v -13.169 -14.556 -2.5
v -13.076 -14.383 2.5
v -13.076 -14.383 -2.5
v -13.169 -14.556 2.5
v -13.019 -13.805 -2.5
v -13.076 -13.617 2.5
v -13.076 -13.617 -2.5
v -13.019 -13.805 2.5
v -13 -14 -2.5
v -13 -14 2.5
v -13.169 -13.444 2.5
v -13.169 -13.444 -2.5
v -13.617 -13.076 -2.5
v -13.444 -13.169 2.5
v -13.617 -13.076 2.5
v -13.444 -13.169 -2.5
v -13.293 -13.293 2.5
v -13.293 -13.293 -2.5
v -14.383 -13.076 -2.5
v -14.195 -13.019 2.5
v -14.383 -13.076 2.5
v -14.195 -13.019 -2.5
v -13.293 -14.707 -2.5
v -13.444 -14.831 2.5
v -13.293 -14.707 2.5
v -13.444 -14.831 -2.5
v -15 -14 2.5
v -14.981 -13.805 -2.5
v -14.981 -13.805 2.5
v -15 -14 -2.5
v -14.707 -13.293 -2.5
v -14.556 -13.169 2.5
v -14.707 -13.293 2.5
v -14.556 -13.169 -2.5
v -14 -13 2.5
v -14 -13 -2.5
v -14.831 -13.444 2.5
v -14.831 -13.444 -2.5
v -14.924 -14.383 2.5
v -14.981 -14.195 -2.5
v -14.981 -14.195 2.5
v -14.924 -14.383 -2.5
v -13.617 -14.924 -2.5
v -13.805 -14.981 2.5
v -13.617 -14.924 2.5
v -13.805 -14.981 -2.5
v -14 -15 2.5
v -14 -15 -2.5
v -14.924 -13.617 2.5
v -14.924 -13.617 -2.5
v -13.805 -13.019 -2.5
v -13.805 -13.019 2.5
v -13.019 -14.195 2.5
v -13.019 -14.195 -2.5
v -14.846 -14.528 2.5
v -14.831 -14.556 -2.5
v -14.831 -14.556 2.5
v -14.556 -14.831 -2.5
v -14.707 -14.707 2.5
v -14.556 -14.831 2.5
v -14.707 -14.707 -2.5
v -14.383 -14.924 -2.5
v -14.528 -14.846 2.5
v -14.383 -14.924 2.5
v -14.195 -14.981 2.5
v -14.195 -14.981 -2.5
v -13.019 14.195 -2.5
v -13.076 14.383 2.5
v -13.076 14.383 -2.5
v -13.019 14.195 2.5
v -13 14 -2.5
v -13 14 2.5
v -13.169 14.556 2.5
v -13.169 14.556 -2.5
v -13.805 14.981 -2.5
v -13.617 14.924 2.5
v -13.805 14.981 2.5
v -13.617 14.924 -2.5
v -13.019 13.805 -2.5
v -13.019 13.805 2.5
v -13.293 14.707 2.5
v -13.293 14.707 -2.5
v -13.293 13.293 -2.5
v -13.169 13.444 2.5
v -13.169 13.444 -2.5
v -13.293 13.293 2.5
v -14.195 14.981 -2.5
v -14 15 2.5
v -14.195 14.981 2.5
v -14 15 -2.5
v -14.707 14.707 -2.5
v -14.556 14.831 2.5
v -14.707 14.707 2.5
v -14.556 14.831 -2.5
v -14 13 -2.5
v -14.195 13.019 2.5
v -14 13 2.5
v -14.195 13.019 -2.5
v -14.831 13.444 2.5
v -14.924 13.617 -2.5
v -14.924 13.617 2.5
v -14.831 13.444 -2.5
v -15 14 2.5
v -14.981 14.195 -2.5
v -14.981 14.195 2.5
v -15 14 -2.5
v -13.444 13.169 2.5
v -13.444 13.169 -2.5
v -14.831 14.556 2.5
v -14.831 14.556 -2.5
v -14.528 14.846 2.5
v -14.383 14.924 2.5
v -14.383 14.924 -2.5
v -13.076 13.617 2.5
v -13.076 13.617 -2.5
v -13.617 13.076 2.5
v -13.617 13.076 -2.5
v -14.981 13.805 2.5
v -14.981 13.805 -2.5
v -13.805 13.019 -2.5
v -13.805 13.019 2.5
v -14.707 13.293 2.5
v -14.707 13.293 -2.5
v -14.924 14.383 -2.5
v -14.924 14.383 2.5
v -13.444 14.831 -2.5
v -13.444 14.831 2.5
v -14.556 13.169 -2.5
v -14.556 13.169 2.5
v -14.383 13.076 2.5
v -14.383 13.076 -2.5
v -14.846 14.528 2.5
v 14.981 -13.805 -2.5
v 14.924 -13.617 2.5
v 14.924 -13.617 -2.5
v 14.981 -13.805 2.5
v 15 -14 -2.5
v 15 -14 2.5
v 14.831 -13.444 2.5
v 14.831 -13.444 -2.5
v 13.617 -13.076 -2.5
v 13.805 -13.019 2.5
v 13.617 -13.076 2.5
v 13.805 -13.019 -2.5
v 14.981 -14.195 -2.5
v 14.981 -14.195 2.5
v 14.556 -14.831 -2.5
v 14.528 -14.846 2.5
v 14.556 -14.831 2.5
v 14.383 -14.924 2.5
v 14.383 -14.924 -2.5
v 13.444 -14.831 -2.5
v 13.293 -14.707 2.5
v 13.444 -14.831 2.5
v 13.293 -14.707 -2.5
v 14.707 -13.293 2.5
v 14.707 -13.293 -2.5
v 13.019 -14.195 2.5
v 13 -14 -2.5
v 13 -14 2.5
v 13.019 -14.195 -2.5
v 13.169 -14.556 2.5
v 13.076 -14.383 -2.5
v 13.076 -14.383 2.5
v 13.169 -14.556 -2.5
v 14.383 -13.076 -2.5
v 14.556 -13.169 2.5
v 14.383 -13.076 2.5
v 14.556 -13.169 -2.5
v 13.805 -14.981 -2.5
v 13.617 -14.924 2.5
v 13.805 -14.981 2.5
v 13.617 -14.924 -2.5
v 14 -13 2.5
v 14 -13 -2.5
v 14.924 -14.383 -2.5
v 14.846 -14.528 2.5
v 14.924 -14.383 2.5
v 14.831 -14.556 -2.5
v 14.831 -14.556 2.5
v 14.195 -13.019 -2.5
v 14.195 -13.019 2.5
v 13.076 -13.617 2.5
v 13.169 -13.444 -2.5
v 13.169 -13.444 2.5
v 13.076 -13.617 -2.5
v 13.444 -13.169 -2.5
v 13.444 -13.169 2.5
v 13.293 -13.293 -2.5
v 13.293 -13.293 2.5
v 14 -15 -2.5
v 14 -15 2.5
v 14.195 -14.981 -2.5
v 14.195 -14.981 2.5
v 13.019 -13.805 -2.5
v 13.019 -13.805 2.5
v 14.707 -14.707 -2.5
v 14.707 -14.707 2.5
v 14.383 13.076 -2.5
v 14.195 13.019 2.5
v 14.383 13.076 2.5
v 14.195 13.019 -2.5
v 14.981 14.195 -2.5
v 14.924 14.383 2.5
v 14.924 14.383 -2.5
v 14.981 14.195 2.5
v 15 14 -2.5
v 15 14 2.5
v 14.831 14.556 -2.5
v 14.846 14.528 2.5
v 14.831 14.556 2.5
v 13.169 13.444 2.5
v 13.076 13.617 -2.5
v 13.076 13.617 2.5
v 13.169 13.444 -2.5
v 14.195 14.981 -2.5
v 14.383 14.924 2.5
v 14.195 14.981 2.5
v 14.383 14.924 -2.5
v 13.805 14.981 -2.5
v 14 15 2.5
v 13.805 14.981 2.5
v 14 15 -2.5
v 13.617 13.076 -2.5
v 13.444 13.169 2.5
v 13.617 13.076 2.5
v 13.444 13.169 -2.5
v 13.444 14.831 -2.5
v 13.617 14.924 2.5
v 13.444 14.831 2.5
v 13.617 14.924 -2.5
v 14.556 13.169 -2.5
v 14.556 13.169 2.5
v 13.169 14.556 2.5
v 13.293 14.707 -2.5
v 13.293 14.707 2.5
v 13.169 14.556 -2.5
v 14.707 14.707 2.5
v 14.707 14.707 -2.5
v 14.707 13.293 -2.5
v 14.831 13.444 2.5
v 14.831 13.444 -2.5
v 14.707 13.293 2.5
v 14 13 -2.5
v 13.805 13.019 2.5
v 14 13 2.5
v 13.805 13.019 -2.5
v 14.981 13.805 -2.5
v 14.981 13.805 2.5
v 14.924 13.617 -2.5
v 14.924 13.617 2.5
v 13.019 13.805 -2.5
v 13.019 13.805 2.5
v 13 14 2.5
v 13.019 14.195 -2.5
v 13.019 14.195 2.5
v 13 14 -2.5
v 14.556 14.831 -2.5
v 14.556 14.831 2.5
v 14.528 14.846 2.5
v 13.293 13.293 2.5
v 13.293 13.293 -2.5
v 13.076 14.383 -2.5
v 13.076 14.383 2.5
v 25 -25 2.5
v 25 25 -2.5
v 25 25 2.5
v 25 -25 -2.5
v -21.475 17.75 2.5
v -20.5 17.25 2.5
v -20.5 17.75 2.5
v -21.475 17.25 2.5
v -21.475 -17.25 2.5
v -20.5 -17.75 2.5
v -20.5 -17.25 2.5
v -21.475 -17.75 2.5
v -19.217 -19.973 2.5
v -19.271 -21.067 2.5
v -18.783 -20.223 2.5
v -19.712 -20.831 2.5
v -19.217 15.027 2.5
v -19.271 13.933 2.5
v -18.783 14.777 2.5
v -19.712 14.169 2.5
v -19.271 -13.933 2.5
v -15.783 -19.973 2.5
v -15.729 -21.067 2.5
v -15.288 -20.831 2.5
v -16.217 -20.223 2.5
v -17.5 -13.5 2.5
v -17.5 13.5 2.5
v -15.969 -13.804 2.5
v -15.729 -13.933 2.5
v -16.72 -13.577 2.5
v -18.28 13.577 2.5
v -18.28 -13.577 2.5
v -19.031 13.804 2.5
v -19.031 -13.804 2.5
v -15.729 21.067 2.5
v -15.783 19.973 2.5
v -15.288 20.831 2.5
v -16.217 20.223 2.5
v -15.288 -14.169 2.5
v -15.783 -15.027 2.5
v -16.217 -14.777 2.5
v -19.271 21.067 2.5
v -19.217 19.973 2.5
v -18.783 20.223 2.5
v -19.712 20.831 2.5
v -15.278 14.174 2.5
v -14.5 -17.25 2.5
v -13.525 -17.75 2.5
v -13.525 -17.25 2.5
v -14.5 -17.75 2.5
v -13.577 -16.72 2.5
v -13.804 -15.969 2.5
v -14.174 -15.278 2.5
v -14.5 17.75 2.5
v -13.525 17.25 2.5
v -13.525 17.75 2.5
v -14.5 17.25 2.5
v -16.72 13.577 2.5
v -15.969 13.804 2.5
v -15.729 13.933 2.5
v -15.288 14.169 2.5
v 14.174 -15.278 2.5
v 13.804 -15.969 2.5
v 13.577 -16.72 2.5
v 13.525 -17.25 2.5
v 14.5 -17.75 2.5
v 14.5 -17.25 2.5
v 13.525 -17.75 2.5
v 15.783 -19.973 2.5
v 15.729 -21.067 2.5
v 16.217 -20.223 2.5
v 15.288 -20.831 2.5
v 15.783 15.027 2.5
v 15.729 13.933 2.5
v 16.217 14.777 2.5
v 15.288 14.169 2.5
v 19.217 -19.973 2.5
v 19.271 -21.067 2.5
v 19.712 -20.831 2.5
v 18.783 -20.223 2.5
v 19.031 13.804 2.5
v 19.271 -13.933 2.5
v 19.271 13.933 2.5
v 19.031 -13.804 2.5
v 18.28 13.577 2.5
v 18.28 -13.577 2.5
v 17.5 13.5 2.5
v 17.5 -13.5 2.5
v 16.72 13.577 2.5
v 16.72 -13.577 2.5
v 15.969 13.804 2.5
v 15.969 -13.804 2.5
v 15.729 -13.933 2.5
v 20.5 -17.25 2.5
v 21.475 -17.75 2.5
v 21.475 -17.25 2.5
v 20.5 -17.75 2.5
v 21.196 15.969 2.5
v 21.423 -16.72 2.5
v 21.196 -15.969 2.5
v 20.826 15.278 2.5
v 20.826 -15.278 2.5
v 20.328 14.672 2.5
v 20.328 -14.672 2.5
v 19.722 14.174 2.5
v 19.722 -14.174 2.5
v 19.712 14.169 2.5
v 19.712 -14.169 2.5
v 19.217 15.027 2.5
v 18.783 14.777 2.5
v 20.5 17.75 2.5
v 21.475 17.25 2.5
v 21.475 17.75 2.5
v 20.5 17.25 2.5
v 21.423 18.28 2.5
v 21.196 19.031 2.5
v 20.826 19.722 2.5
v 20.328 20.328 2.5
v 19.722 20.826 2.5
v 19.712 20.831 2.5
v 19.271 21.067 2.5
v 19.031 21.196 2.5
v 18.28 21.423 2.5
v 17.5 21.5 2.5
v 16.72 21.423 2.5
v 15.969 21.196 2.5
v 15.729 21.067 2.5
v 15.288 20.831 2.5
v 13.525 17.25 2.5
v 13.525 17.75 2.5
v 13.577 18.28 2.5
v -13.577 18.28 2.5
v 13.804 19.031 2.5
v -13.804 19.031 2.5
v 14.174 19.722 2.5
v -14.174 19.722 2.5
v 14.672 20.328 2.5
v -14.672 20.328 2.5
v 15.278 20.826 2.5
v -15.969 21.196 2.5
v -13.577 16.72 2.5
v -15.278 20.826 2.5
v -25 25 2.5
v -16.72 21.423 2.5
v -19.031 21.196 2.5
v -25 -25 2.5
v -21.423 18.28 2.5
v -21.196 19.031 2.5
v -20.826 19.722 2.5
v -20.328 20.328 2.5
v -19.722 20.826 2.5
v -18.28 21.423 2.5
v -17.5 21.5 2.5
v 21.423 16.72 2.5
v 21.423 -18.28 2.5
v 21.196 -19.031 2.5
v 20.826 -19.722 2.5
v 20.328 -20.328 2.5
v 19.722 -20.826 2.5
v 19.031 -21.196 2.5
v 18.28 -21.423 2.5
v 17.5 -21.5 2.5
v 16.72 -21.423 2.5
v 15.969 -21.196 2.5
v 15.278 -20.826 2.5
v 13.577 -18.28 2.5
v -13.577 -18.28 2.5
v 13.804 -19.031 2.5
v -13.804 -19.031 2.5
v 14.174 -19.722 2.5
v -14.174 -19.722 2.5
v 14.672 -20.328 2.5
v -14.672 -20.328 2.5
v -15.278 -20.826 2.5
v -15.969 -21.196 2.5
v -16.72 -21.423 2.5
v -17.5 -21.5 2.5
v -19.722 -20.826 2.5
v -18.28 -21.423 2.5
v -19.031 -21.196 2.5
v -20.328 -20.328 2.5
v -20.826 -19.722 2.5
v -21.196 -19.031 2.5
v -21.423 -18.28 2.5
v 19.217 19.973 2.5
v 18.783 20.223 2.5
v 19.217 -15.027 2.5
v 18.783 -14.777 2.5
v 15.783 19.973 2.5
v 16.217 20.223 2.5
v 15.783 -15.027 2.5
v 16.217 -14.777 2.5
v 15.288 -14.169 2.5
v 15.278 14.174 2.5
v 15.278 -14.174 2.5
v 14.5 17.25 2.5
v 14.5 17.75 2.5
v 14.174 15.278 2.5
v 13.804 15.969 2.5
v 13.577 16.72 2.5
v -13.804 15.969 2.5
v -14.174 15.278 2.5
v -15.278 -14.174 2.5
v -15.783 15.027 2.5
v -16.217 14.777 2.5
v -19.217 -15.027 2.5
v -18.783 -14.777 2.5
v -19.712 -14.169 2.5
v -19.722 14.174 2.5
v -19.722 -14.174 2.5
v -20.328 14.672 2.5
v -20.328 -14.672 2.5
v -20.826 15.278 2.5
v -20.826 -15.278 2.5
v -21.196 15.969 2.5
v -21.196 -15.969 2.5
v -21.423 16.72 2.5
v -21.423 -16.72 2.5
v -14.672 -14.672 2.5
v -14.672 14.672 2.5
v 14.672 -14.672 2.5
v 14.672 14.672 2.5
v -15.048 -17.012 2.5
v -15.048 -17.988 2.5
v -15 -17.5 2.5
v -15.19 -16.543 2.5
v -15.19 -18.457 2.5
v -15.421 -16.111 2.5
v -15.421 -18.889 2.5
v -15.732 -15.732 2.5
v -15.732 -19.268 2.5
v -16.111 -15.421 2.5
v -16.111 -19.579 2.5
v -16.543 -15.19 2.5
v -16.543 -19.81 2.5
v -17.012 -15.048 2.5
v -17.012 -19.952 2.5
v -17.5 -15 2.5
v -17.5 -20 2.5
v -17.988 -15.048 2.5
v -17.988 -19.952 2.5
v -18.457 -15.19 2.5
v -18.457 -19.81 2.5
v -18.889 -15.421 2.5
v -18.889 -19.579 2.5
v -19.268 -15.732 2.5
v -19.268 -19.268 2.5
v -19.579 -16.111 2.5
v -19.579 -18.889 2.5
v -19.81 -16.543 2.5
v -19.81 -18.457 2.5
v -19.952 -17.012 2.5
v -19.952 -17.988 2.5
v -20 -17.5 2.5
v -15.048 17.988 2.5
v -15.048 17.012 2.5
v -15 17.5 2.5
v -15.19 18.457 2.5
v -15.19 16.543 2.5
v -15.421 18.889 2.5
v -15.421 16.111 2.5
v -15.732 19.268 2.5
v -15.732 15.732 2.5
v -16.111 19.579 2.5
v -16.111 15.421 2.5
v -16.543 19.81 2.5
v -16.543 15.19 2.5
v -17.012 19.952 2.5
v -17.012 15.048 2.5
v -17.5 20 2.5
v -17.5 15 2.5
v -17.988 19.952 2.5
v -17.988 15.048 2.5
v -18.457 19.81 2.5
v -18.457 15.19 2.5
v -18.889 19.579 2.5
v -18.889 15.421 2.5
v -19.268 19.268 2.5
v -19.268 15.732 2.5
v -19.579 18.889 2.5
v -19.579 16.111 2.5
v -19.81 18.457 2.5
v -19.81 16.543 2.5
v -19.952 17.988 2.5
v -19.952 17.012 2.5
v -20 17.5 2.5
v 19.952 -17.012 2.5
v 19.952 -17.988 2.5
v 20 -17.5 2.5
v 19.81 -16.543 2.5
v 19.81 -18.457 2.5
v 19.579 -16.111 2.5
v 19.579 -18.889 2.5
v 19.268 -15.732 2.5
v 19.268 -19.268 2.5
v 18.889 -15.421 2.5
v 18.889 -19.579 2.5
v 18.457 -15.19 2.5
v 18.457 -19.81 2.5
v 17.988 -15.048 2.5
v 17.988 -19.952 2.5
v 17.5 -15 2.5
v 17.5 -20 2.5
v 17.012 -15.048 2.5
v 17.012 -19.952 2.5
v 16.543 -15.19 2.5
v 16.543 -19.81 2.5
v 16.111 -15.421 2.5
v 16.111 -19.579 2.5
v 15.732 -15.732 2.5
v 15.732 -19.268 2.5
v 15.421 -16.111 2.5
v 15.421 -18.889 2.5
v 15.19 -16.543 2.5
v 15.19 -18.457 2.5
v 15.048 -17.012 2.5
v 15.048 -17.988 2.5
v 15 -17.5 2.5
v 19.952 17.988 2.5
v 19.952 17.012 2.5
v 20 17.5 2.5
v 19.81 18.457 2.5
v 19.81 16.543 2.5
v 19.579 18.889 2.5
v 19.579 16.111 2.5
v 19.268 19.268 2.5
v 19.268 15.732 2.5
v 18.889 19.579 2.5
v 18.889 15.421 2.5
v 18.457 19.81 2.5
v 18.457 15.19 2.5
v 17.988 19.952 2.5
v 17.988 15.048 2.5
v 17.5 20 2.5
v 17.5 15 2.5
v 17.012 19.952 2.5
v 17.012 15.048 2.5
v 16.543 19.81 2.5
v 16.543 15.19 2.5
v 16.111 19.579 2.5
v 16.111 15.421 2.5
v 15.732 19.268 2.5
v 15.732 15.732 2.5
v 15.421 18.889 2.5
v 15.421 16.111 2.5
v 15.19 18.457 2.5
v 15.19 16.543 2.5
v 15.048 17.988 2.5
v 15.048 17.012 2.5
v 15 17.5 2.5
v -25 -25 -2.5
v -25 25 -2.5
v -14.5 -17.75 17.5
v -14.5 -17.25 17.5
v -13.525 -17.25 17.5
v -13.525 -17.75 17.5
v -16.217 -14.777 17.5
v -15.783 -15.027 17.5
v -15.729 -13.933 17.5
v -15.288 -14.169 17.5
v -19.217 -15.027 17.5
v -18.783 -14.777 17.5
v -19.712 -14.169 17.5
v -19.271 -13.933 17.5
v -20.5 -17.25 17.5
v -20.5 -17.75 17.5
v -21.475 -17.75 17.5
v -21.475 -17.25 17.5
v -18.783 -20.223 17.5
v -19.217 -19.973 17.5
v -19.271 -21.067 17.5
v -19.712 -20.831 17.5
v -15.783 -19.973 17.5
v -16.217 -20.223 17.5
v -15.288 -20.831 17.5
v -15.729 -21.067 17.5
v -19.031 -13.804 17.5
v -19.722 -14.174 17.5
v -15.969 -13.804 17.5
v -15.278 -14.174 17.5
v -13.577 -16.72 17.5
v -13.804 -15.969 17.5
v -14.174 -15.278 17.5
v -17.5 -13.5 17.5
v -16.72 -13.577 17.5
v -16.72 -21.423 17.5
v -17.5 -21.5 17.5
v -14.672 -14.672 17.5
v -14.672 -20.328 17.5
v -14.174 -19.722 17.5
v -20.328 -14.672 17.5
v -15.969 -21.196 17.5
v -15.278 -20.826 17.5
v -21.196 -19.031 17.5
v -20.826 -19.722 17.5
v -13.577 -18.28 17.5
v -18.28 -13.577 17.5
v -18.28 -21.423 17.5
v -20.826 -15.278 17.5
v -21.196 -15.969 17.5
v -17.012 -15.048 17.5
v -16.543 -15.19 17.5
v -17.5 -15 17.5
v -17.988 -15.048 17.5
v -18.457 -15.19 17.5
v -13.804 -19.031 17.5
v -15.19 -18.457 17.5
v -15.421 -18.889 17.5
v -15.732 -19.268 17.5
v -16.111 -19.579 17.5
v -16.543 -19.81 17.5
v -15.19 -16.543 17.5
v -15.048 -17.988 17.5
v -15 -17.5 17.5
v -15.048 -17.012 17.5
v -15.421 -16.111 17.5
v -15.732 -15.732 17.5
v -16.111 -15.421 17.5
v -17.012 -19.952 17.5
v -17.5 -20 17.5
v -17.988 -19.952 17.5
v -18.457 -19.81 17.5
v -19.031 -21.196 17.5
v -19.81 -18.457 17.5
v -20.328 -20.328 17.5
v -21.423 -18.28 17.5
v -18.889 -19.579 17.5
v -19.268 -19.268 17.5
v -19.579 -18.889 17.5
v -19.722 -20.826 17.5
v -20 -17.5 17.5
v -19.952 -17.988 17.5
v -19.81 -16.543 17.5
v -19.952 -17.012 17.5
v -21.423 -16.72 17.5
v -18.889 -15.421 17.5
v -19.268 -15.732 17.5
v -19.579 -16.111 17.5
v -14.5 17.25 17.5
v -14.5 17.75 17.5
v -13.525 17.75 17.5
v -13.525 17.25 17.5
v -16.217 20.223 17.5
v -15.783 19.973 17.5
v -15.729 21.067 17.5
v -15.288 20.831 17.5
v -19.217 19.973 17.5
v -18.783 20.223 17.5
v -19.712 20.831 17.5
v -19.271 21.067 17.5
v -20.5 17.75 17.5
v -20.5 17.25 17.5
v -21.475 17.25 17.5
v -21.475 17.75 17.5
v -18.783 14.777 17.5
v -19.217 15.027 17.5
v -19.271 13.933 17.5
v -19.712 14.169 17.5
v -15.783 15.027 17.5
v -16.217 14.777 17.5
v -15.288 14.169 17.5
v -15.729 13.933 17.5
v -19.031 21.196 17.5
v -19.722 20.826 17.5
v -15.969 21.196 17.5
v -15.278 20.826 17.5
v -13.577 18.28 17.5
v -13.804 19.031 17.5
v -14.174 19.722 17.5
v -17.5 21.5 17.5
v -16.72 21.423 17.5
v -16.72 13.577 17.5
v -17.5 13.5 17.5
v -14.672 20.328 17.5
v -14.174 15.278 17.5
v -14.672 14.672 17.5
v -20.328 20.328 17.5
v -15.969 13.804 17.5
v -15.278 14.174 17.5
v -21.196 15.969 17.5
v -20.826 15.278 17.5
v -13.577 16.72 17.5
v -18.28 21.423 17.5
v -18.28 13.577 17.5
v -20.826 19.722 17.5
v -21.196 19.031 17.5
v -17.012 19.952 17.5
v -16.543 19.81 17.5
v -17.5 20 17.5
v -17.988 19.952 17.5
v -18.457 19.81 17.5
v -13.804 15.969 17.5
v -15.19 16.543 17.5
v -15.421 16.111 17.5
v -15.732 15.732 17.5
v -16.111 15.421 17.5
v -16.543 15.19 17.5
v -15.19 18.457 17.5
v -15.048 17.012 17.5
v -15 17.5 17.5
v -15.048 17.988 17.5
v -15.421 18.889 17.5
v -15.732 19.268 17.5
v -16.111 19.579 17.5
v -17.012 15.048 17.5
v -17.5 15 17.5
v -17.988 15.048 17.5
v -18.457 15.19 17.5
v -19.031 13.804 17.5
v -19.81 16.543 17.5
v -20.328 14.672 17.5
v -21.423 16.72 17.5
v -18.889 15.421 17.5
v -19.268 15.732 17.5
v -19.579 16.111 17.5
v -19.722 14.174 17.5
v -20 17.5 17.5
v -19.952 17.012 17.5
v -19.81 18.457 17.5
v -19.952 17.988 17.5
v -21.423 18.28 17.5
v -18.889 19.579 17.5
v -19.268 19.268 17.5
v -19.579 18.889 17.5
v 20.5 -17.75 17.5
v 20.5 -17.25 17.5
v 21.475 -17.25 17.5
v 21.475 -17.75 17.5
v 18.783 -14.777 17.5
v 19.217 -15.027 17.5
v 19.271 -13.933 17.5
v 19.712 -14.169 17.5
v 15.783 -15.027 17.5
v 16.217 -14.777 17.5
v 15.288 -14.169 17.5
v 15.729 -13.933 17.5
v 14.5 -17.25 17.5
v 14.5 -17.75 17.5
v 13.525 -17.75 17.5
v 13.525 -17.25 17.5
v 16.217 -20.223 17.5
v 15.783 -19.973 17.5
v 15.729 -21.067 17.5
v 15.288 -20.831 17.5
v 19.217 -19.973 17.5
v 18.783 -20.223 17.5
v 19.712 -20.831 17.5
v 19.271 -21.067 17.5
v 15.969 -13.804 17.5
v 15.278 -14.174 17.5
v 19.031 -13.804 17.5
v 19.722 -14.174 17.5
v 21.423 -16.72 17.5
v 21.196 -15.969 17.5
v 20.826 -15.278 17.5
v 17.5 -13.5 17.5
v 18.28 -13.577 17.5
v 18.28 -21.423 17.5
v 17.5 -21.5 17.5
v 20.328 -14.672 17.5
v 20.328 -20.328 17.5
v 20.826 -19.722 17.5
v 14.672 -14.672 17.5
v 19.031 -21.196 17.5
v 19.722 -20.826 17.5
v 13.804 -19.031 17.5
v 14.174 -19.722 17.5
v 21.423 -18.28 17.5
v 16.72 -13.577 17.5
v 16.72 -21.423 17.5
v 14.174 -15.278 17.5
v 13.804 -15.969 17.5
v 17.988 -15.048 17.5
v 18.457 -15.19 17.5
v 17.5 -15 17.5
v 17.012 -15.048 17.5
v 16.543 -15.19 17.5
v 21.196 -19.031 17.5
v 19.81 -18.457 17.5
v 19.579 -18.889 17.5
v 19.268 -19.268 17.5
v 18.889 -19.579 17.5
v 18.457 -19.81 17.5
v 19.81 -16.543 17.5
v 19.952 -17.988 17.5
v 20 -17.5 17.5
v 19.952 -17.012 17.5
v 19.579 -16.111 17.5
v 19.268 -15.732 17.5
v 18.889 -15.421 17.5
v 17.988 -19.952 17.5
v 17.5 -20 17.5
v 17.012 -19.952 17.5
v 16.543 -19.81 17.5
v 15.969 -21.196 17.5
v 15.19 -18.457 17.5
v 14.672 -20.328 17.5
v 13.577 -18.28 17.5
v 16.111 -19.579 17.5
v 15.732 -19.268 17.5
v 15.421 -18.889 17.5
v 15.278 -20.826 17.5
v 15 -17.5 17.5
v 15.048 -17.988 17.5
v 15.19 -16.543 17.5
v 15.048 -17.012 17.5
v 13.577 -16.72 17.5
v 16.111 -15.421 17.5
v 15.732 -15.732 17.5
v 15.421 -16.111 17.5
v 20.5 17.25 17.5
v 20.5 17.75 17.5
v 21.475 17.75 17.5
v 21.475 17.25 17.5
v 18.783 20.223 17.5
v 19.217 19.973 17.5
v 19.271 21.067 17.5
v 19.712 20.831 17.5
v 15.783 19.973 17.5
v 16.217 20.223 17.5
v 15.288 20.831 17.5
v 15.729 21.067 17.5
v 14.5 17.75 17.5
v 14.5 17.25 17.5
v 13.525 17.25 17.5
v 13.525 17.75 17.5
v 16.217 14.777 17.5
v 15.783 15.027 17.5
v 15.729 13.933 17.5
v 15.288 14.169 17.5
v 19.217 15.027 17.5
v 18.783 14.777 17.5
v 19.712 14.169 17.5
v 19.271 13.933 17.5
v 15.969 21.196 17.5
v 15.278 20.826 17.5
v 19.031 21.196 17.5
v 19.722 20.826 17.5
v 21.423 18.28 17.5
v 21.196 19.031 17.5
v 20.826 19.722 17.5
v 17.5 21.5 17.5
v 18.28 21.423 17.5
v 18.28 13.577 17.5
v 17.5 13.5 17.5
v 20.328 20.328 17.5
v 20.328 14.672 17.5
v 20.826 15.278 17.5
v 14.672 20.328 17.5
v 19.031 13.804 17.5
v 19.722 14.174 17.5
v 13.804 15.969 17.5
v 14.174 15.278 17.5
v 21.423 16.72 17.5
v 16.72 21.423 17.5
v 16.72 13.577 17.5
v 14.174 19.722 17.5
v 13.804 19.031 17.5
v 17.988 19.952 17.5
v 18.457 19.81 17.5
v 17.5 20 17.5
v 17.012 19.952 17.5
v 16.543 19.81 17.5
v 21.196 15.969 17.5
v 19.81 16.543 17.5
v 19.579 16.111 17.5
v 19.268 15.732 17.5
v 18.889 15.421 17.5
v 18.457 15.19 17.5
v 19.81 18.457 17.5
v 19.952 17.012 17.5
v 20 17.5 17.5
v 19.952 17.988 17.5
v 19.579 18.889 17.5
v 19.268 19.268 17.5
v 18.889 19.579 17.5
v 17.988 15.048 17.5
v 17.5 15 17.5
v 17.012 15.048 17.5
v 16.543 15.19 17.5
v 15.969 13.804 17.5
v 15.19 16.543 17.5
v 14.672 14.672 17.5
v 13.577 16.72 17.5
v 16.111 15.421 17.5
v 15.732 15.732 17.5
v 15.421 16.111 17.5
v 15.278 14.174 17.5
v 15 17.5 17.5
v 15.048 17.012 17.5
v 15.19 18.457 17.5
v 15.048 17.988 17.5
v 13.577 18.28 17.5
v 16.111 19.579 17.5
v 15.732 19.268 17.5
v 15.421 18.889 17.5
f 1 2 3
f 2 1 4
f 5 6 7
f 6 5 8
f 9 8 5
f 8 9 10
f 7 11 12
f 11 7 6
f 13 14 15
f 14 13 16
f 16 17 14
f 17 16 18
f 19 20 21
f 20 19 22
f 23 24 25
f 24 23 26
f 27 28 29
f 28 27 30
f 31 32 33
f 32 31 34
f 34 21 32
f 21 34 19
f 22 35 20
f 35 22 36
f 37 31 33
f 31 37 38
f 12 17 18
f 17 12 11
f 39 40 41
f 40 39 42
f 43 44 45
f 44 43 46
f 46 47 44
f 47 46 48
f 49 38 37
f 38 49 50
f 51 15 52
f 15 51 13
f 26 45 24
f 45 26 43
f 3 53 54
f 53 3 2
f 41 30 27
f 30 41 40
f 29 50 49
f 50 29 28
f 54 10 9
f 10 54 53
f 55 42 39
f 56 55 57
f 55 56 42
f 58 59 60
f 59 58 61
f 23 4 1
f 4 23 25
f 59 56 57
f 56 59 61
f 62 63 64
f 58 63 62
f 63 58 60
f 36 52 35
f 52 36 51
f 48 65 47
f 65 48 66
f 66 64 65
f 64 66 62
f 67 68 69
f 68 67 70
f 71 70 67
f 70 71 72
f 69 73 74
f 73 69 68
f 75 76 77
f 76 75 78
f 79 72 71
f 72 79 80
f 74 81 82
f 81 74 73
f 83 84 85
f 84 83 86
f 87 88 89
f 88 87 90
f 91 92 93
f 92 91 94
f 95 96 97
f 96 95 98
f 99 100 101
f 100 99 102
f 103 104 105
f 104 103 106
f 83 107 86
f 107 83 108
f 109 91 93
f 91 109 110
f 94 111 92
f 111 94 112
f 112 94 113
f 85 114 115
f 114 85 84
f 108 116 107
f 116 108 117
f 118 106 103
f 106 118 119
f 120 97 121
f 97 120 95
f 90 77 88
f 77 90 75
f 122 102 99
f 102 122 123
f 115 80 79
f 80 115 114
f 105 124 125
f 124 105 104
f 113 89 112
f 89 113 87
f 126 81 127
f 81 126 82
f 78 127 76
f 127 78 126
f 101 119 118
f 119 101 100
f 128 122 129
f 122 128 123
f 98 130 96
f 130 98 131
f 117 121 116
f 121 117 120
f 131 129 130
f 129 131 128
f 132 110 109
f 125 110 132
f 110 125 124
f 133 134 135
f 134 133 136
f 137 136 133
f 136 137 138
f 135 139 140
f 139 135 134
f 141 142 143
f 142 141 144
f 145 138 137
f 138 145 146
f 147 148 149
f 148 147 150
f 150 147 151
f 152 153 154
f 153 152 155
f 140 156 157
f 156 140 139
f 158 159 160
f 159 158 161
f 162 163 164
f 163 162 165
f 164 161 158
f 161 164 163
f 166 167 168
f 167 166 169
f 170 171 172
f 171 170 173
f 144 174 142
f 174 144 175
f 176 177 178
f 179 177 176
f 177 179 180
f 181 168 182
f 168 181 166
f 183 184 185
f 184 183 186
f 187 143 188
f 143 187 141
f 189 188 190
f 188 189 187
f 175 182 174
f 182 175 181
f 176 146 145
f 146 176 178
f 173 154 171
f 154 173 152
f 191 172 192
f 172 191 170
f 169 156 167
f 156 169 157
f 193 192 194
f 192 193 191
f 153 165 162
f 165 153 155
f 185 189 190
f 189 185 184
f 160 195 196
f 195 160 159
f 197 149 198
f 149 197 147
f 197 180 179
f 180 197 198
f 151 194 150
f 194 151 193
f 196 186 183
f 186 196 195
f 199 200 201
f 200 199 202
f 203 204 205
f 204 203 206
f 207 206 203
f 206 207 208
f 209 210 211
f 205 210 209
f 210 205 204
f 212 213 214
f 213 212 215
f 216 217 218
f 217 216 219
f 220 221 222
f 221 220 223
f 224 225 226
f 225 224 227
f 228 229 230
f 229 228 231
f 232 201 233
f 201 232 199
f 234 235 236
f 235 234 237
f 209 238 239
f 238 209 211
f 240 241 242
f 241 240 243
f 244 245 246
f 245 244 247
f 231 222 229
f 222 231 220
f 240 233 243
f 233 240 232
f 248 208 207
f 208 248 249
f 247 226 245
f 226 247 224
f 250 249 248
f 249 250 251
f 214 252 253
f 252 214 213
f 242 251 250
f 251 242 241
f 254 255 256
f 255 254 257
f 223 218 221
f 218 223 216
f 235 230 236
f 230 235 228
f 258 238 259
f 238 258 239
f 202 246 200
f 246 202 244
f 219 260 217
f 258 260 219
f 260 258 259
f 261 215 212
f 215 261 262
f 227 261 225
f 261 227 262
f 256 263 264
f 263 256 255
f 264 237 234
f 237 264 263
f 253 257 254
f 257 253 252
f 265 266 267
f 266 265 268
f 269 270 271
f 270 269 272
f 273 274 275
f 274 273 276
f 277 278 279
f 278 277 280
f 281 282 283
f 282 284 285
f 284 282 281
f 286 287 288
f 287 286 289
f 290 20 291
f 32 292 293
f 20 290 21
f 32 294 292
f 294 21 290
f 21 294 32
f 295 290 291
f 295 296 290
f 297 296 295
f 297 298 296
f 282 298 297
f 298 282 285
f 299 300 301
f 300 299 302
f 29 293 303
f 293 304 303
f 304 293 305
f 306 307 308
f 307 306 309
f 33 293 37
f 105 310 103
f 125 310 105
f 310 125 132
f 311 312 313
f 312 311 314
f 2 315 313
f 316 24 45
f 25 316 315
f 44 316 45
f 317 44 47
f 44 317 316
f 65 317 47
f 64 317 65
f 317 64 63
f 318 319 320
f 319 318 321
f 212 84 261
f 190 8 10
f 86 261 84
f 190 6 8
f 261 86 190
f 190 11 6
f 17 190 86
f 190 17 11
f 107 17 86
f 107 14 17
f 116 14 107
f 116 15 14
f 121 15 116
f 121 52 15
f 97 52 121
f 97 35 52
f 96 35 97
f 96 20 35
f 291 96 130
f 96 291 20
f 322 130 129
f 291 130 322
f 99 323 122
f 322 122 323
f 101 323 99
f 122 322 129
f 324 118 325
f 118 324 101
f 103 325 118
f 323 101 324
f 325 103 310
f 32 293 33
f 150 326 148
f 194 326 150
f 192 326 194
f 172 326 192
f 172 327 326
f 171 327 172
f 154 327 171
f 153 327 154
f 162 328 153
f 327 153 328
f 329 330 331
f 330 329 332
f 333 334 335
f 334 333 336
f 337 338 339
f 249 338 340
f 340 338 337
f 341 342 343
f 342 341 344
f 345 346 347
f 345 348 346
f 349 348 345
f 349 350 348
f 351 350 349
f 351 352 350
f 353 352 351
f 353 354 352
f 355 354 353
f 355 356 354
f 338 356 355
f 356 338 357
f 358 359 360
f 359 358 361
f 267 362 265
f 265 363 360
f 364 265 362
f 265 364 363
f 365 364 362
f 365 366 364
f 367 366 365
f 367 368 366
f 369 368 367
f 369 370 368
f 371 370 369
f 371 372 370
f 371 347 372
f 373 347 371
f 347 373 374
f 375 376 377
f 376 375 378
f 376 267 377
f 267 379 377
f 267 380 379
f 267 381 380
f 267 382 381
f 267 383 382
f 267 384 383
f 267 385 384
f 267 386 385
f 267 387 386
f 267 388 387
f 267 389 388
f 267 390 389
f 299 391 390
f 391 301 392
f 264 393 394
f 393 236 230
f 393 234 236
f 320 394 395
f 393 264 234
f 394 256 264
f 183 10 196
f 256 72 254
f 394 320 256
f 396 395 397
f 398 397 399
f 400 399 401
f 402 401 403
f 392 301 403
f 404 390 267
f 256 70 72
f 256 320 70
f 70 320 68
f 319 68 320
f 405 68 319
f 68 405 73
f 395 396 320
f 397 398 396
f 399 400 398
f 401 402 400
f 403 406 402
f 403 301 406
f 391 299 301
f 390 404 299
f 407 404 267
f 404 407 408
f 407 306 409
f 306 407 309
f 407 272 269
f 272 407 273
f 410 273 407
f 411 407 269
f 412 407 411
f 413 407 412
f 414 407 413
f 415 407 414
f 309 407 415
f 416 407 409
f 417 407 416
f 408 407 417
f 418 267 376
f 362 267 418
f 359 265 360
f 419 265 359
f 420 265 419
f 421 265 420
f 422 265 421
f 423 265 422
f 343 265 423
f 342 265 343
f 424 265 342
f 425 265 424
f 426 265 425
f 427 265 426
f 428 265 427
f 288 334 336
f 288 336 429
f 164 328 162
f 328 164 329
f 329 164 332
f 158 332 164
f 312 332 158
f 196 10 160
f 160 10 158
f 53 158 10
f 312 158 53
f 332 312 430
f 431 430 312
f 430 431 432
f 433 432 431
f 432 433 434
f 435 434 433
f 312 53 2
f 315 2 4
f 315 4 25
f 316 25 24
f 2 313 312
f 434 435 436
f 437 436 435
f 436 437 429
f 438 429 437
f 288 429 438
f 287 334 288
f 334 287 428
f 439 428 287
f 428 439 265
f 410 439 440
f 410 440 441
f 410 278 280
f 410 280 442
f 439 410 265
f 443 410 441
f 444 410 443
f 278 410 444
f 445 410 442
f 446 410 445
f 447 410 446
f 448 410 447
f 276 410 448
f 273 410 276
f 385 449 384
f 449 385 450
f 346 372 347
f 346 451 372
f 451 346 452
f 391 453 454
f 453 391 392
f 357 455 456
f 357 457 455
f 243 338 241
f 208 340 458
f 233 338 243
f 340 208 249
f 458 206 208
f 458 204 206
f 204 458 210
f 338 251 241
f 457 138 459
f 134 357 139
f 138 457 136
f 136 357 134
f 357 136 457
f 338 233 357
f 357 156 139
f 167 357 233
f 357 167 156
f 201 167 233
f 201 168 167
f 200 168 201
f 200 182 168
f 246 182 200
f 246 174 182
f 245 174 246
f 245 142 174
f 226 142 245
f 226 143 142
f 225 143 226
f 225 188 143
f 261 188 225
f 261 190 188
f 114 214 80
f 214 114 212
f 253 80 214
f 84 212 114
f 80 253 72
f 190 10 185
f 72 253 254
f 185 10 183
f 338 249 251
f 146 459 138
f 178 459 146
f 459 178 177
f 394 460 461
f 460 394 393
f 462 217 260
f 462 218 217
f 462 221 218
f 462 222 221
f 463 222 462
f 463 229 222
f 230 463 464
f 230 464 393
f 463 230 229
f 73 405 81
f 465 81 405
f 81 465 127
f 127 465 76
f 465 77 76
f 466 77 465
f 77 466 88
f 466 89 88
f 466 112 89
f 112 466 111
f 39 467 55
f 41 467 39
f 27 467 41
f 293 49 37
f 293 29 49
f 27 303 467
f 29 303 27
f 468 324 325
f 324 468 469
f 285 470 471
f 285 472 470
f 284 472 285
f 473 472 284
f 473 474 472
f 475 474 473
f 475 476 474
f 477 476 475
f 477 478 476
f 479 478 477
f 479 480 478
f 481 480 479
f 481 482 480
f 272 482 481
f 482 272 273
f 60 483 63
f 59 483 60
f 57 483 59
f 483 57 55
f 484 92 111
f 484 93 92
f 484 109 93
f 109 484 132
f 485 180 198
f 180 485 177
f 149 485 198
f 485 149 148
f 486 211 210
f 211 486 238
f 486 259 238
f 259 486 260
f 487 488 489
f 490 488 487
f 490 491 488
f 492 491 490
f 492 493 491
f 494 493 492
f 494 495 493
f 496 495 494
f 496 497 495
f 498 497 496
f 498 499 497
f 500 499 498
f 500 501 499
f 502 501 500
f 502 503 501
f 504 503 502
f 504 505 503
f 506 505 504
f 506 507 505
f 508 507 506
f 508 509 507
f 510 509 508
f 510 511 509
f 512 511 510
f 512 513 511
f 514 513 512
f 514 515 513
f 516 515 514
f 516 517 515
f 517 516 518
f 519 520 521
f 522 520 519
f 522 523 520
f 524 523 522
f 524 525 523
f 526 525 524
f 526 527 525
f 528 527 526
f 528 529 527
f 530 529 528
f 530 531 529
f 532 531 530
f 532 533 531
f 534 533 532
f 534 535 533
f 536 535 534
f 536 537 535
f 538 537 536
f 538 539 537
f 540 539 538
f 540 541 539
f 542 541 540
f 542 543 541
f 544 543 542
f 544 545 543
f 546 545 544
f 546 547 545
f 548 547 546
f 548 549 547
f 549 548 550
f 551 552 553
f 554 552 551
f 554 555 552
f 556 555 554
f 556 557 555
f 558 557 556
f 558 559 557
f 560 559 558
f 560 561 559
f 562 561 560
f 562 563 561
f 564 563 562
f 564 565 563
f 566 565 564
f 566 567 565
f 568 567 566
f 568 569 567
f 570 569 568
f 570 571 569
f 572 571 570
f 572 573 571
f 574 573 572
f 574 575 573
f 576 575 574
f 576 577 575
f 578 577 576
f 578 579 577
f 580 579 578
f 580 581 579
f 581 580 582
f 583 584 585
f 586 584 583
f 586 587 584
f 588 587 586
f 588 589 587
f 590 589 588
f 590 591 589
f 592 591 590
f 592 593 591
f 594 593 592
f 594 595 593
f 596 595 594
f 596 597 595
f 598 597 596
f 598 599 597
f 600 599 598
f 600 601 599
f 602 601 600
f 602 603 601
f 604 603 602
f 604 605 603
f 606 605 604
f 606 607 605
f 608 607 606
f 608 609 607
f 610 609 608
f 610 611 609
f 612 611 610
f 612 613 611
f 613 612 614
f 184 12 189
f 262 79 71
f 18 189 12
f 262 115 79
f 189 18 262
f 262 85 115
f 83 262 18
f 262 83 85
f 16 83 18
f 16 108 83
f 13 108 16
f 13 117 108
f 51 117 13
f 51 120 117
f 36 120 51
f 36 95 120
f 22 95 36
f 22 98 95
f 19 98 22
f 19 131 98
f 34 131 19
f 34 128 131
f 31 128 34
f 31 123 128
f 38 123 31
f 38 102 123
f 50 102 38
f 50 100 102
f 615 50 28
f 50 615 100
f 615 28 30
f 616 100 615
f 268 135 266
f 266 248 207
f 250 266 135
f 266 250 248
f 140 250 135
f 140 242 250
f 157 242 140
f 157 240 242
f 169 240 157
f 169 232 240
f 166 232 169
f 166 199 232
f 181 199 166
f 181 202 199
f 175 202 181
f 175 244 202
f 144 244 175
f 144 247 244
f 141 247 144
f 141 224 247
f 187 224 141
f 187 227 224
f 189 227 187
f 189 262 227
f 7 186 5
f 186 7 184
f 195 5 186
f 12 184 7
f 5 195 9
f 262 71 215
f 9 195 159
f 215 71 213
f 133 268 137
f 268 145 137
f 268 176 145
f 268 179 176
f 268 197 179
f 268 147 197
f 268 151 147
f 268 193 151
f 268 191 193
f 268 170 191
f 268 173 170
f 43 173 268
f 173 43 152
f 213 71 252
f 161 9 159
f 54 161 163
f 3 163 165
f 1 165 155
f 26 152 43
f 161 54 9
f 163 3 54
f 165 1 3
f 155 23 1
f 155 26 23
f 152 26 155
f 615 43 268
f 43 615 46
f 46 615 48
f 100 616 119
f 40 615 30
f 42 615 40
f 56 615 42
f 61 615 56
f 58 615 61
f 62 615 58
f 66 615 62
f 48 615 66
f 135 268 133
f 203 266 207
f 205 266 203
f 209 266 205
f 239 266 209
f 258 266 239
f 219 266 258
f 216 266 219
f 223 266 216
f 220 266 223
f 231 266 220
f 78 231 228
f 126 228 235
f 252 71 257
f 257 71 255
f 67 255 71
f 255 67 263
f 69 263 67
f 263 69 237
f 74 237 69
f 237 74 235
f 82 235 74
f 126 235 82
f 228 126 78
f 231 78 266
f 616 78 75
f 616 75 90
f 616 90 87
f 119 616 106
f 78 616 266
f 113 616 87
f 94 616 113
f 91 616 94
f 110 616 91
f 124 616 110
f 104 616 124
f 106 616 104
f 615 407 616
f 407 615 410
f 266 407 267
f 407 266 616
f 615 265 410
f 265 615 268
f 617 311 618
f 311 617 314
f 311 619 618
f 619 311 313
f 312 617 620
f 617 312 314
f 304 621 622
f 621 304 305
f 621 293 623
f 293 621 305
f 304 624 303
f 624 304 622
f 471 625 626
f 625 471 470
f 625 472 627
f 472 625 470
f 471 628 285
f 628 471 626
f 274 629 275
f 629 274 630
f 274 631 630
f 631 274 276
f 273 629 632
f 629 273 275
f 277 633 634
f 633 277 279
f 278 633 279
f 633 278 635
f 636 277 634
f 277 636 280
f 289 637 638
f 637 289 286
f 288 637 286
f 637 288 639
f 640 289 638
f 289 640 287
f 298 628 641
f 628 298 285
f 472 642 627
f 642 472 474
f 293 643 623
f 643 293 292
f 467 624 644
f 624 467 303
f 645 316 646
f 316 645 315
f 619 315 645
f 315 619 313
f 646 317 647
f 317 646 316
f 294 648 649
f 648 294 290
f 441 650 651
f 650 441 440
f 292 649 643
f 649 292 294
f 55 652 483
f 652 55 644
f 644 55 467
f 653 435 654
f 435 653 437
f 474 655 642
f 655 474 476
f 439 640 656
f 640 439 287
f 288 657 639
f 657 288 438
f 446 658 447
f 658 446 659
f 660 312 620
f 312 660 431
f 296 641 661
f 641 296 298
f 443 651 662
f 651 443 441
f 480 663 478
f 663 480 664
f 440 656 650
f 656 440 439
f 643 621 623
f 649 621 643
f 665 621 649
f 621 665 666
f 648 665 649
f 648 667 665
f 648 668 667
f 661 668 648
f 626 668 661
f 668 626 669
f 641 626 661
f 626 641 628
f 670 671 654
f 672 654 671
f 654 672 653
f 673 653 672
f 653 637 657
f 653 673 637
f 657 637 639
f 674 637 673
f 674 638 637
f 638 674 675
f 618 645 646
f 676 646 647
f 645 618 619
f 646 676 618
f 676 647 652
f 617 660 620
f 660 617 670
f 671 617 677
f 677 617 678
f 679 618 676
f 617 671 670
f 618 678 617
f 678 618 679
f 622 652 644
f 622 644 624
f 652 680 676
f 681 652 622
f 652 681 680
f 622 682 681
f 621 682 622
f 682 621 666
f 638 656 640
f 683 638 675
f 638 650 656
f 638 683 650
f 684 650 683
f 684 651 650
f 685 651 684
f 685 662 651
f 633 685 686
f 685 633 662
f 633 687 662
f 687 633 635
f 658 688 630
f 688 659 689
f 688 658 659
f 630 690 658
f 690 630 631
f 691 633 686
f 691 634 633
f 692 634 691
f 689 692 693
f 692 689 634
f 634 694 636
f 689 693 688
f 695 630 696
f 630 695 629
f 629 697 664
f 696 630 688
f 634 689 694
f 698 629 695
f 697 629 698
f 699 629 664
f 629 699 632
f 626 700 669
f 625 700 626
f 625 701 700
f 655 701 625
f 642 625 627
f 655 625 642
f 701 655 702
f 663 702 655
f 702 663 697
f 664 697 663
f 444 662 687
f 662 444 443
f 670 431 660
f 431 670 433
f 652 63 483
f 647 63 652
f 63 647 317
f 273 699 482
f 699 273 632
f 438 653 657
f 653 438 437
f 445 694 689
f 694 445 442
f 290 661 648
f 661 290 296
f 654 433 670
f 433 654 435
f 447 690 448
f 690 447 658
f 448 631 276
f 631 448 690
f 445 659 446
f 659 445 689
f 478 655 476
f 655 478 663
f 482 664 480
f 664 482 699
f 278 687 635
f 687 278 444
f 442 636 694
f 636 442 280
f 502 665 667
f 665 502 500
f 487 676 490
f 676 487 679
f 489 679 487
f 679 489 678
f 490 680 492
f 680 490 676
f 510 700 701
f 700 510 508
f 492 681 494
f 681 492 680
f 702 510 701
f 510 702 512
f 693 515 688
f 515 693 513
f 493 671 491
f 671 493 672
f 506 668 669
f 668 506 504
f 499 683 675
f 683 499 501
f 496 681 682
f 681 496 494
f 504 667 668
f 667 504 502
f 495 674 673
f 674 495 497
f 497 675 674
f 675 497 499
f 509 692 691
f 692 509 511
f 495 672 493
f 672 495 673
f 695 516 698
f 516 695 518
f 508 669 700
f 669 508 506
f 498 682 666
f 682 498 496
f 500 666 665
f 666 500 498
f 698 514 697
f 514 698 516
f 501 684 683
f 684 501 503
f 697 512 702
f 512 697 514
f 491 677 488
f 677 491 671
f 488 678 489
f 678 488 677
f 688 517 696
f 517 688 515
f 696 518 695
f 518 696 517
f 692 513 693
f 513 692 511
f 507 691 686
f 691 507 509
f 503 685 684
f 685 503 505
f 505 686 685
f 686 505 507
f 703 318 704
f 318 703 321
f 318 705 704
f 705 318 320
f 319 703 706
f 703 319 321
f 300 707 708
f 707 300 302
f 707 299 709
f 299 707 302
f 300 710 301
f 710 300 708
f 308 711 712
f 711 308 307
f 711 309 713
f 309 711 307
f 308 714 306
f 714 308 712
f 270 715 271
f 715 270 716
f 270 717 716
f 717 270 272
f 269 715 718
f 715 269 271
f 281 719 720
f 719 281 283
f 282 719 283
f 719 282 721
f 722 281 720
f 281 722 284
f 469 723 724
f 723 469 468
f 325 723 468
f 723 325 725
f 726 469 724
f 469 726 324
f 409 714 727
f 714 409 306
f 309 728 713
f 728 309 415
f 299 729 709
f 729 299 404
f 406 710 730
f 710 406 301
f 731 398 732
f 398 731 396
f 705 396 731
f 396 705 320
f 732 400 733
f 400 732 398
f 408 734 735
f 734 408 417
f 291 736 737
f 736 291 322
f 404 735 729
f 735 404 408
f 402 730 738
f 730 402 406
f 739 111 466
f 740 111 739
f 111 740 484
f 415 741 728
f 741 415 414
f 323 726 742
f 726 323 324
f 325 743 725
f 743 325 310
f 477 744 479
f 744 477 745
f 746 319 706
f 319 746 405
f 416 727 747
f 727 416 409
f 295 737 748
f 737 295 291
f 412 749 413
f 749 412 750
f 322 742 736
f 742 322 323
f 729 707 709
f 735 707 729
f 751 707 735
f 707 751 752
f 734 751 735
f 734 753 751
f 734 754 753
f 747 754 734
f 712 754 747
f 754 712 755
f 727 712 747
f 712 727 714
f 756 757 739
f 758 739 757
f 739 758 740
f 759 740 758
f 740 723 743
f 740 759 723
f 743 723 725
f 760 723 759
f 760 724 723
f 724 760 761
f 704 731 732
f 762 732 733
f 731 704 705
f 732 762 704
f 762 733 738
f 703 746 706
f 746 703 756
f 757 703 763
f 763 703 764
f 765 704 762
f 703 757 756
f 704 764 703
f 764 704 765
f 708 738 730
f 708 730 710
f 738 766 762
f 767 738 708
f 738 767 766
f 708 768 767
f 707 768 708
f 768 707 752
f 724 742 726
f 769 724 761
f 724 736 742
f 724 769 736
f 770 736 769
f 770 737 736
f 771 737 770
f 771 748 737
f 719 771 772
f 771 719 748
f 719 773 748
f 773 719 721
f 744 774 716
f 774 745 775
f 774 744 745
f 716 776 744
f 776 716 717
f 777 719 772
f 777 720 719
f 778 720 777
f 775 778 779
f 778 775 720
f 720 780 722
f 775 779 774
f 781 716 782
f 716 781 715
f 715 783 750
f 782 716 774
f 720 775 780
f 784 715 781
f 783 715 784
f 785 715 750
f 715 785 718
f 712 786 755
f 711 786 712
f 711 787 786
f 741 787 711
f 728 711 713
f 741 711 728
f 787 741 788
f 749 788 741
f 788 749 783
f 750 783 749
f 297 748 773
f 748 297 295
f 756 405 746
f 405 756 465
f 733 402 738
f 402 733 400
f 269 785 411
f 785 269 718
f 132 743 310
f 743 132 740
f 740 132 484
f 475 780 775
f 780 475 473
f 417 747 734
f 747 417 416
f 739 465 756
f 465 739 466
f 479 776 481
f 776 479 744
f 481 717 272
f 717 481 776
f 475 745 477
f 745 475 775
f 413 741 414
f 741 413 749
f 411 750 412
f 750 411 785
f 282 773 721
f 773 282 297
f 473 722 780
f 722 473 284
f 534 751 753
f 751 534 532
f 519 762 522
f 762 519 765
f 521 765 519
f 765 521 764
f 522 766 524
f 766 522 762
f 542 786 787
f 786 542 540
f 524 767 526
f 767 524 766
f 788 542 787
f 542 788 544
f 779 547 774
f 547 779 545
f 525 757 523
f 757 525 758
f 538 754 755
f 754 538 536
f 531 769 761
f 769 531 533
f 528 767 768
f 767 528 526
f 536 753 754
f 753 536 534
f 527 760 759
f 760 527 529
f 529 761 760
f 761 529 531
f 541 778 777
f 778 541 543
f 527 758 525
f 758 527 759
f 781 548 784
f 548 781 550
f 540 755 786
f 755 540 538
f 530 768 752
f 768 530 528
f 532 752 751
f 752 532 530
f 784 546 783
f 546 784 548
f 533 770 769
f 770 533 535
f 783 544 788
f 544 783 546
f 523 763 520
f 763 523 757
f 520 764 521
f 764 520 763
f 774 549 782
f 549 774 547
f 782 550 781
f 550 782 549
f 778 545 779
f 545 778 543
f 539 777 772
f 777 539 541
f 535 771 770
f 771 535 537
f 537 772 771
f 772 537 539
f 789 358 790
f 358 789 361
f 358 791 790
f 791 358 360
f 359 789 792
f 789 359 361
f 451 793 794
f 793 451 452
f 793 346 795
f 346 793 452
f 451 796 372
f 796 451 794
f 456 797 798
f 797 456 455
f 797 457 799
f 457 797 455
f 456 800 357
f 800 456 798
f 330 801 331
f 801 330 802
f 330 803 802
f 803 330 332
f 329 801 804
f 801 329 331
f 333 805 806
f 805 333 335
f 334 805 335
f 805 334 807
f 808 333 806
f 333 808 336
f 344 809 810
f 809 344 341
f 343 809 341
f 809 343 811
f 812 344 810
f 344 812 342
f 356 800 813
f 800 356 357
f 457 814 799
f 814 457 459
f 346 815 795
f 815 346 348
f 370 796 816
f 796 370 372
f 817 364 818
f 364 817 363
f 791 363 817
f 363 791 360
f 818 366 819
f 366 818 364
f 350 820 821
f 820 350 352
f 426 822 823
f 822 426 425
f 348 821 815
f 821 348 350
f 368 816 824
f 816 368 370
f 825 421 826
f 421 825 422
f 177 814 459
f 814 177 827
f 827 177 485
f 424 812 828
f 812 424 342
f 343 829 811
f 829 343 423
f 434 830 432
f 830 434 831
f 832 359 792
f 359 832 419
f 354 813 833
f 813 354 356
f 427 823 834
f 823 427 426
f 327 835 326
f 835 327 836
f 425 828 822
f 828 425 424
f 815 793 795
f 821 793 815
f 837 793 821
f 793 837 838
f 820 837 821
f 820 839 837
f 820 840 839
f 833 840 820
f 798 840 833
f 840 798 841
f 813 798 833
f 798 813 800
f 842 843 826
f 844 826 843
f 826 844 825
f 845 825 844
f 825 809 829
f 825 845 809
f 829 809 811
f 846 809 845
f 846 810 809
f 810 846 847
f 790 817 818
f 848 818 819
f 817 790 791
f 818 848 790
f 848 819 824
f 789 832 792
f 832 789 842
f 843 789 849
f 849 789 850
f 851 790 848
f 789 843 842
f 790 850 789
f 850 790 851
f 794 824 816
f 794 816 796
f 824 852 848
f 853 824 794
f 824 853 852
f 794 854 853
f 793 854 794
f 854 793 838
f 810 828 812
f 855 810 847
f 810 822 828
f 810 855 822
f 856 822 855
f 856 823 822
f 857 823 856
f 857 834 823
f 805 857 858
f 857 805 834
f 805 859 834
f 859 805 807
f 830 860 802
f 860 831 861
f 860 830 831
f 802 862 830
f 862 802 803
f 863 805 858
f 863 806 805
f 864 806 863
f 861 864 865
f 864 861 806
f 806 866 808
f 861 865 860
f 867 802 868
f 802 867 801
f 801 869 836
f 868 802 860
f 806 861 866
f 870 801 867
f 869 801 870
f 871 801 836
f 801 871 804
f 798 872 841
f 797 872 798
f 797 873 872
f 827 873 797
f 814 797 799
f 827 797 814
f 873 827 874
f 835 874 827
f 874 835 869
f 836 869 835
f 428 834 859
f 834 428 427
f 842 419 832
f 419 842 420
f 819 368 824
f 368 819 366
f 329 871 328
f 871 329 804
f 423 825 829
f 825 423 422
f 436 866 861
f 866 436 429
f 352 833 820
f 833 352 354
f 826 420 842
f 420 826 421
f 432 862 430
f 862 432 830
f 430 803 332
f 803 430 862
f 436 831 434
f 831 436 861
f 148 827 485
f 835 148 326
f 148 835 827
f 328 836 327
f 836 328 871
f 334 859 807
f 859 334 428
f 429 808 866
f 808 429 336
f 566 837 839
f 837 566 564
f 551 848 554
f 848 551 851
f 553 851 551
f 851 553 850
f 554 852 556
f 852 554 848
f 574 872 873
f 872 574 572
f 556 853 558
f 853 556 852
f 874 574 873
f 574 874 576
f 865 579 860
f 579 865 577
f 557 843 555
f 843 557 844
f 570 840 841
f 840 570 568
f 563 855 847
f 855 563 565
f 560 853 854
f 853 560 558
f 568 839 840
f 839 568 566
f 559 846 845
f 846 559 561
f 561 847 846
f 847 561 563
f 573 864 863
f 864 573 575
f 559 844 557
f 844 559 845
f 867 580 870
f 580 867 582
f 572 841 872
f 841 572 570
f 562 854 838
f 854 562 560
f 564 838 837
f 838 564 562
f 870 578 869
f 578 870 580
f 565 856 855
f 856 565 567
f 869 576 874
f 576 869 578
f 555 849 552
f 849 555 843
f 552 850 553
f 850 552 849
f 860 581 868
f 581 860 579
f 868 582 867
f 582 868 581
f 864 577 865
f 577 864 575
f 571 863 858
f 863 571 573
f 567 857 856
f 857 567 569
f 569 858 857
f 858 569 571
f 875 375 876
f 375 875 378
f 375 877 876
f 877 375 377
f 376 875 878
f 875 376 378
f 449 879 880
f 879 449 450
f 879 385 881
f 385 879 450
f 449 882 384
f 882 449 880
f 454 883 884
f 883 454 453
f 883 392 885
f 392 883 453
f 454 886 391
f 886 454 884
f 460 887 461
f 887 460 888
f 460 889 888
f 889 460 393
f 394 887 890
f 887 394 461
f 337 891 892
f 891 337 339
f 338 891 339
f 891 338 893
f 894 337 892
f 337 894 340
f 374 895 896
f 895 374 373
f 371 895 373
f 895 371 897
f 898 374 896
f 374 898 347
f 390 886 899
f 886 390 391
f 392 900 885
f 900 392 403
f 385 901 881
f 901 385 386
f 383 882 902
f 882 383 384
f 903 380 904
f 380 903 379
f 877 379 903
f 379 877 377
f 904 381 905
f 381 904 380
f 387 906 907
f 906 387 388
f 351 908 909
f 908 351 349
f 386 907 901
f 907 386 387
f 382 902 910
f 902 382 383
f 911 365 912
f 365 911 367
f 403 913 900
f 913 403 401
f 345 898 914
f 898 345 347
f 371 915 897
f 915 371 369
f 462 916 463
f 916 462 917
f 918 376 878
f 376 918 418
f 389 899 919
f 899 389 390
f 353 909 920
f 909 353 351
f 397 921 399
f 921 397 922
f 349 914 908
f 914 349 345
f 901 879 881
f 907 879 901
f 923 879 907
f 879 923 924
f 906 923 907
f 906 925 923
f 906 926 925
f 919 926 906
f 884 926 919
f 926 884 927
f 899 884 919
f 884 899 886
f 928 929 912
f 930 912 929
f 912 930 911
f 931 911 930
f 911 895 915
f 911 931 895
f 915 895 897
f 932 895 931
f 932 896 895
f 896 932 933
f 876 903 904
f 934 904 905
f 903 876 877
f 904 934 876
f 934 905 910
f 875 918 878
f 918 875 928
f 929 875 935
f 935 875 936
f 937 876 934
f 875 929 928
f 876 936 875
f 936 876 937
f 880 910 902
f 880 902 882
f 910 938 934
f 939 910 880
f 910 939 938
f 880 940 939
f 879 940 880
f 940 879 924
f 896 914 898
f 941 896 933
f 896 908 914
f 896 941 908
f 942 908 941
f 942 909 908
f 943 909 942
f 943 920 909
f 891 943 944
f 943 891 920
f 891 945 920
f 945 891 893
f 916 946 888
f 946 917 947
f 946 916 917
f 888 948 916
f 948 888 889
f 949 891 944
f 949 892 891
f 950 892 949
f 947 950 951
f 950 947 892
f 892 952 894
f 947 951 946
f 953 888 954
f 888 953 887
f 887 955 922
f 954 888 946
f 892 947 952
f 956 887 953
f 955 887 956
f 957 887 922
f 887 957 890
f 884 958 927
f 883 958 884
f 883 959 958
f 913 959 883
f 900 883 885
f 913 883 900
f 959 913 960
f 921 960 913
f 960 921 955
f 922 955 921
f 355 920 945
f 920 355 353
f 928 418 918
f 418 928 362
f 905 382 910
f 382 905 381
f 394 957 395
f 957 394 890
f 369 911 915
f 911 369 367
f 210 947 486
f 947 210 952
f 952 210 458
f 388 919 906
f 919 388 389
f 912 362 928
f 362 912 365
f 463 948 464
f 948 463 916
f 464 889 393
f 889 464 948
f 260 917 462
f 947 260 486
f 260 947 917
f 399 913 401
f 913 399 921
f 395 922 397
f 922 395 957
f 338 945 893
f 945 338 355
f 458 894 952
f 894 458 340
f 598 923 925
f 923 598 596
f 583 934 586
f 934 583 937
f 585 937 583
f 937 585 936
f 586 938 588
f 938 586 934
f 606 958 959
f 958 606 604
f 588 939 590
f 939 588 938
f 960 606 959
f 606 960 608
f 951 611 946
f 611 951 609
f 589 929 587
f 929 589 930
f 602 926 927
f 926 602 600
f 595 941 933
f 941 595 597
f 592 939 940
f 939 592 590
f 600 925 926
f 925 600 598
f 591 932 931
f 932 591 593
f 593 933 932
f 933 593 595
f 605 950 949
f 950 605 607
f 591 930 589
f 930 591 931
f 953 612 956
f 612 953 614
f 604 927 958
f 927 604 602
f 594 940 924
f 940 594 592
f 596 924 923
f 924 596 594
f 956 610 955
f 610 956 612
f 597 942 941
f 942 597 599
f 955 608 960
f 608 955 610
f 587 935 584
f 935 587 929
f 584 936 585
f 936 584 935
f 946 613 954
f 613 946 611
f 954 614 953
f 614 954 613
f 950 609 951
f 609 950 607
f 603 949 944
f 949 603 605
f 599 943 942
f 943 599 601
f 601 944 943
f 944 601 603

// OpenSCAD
// Module Design Pattern Template
// Demonstrates best practices for organizing code with reusable modules
// Modules promote code reuse, clarity, and maintainability

// ============================================
// CONFIGURATION SECTION
// ============================================

$fn = 32;

// Component dimensions
connector_diameter = 8;
connector_length = 15;
connector_wall = 1.5;

base_size = 50;
base_height = 5;

// ============================================
// UTILITY MODULES (General Purpose)
// ============================================

// Create a hollow cylinder (tube/connector)
module hollow_cylinder(od, id, height) {
    difference() {
        cylinder(h = height, d = od, center = true);
        cylinder(h = height + 1, d = id, center = true);
    }
}

// Create a flat base/mounting plate
module flat_base(size, thickness) {
    cube([size, size, thickness], center = true);
}

// Create corner supports for strengthening
module corner_support(size, height) {
    linear_extrude(height = height, center = true)
        polygon(points = [[0, 0], [size, 0], [0, size]]);
}

// ============================================
// SPECIFIC COMPONENT MODULES
// ============================================

// Connector with internal thread pattern (for joining parts)
module connector_with_threads(od, id, length, threads) {
    difference() {
        // Main connector body
        cylinder(h = length, d = od, center = true);
        
        // Hollow core
        cylinder(h = length + 1, d = id, center = true);
        
        // Thread pattern (decorative/functional grooves)
        for (i = [0 : threads - 1]) {
            rotate([0, 0, (360 / threads) * i])
                translate([od/2 - 0.5, 0, 0])
                    cube([1, 0.5, length + 1], center = true);
        }
    }
}

// Joint/coupling to connect two parts
module coupling_joint(connector_od, connector_id, couple_length) {
    cylinder(h = couple_length, d = connector_od, center = true);
}

// Base with mounting holes
module base_with_holes(size, thickness, hole_diameter, hole_spacing) {
    difference() {
        // Solid base
        flat_base(size, thickness);
        
        // Subtract mounting holes
        for (x = [-hole_spacing/2, hole_spacing/2]) {
            for (y = [-hole_spacing/2, hole_spacing/2]) {
                translate([x, y, 0])
                    cylinder(h = thickness + 1, d = hole_diameter, center = true);
            }
        }
    }
}

// ============================================
// ASSEMBLY MODULES (Combine Components)
// ============================================

// Basic assembly: base + connector
module simple_connector_assembly(base_sz, base_h, conn_od, conn_id, conn_len) {
    // Base plate
    flat_base(base_sz, base_h);
    
    // Connector mounted vertically
    translate([0, 0, base_h/2 + conn_len/2])
        hollow_cylinder(conn_od, conn_id, conn_len);
}

// Complex assembly with multiple connectors
module multi_connector_assembly(base_sz, base_h, spacing) {
    // Central base
    base_with_holes(base_sz, base_h, 2, spacing * 0.8);
    
    // Mounted connectors at four corners
    for (x = [-spacing/2, spacing/2]) {
        for (y = [-spacing/2, spacing/2]) {
            translate([x, y, base_h/2 + connector_length/2])
                connector_with_threads(connector_diameter, 
                                      connector_diameter - 2*connector_wall, 
                                      connector_length, 
                                      6);
        }
    }
}

// ============================================
// OUTPUT SECTION
// ============================================

// Choose which assembly to render:

// Option 1: Simple assembly
// simple_connector_assembly(base_size, base_height, 
//                          connector_diameter, 
//                          connector_diameter - 2*connector_wall, 
//                          connector_length);

// Option 2: Multi-connector assembly
multi_connector_assembly(base_size, base_height, base_size * 0.7);

// ============================================
// MODULE DESIGN BEST PRACTICES
// ============================================
// 1. Utility Modules: General-purpose shapes
//    - Reusable across many projects
//    - Keep parameters generic
//
// 2. Component Modules: Specific parts
//    - Build on utility modules
//    - Include feature-specific logic
//
// 3. Assembly Modules: Combine components
//    - Use positioning and transforms
//    - Organize parts spatially
//
// 4. Naming Conventions:
//    - Use descriptive names (hollow_cylinder, not hc)
//    - Prefix related modules (base_*, connector_*)
//
// 5. Parameter Guidelines:
//    - Put adjustable values at top
//    - Use meaningful default values
//    - Document parameter purposes
//
// 6. Code Organization:
//    - Group related modules
//    - Start with utilities, end with assemblies
//    - Use comments to separate sections
